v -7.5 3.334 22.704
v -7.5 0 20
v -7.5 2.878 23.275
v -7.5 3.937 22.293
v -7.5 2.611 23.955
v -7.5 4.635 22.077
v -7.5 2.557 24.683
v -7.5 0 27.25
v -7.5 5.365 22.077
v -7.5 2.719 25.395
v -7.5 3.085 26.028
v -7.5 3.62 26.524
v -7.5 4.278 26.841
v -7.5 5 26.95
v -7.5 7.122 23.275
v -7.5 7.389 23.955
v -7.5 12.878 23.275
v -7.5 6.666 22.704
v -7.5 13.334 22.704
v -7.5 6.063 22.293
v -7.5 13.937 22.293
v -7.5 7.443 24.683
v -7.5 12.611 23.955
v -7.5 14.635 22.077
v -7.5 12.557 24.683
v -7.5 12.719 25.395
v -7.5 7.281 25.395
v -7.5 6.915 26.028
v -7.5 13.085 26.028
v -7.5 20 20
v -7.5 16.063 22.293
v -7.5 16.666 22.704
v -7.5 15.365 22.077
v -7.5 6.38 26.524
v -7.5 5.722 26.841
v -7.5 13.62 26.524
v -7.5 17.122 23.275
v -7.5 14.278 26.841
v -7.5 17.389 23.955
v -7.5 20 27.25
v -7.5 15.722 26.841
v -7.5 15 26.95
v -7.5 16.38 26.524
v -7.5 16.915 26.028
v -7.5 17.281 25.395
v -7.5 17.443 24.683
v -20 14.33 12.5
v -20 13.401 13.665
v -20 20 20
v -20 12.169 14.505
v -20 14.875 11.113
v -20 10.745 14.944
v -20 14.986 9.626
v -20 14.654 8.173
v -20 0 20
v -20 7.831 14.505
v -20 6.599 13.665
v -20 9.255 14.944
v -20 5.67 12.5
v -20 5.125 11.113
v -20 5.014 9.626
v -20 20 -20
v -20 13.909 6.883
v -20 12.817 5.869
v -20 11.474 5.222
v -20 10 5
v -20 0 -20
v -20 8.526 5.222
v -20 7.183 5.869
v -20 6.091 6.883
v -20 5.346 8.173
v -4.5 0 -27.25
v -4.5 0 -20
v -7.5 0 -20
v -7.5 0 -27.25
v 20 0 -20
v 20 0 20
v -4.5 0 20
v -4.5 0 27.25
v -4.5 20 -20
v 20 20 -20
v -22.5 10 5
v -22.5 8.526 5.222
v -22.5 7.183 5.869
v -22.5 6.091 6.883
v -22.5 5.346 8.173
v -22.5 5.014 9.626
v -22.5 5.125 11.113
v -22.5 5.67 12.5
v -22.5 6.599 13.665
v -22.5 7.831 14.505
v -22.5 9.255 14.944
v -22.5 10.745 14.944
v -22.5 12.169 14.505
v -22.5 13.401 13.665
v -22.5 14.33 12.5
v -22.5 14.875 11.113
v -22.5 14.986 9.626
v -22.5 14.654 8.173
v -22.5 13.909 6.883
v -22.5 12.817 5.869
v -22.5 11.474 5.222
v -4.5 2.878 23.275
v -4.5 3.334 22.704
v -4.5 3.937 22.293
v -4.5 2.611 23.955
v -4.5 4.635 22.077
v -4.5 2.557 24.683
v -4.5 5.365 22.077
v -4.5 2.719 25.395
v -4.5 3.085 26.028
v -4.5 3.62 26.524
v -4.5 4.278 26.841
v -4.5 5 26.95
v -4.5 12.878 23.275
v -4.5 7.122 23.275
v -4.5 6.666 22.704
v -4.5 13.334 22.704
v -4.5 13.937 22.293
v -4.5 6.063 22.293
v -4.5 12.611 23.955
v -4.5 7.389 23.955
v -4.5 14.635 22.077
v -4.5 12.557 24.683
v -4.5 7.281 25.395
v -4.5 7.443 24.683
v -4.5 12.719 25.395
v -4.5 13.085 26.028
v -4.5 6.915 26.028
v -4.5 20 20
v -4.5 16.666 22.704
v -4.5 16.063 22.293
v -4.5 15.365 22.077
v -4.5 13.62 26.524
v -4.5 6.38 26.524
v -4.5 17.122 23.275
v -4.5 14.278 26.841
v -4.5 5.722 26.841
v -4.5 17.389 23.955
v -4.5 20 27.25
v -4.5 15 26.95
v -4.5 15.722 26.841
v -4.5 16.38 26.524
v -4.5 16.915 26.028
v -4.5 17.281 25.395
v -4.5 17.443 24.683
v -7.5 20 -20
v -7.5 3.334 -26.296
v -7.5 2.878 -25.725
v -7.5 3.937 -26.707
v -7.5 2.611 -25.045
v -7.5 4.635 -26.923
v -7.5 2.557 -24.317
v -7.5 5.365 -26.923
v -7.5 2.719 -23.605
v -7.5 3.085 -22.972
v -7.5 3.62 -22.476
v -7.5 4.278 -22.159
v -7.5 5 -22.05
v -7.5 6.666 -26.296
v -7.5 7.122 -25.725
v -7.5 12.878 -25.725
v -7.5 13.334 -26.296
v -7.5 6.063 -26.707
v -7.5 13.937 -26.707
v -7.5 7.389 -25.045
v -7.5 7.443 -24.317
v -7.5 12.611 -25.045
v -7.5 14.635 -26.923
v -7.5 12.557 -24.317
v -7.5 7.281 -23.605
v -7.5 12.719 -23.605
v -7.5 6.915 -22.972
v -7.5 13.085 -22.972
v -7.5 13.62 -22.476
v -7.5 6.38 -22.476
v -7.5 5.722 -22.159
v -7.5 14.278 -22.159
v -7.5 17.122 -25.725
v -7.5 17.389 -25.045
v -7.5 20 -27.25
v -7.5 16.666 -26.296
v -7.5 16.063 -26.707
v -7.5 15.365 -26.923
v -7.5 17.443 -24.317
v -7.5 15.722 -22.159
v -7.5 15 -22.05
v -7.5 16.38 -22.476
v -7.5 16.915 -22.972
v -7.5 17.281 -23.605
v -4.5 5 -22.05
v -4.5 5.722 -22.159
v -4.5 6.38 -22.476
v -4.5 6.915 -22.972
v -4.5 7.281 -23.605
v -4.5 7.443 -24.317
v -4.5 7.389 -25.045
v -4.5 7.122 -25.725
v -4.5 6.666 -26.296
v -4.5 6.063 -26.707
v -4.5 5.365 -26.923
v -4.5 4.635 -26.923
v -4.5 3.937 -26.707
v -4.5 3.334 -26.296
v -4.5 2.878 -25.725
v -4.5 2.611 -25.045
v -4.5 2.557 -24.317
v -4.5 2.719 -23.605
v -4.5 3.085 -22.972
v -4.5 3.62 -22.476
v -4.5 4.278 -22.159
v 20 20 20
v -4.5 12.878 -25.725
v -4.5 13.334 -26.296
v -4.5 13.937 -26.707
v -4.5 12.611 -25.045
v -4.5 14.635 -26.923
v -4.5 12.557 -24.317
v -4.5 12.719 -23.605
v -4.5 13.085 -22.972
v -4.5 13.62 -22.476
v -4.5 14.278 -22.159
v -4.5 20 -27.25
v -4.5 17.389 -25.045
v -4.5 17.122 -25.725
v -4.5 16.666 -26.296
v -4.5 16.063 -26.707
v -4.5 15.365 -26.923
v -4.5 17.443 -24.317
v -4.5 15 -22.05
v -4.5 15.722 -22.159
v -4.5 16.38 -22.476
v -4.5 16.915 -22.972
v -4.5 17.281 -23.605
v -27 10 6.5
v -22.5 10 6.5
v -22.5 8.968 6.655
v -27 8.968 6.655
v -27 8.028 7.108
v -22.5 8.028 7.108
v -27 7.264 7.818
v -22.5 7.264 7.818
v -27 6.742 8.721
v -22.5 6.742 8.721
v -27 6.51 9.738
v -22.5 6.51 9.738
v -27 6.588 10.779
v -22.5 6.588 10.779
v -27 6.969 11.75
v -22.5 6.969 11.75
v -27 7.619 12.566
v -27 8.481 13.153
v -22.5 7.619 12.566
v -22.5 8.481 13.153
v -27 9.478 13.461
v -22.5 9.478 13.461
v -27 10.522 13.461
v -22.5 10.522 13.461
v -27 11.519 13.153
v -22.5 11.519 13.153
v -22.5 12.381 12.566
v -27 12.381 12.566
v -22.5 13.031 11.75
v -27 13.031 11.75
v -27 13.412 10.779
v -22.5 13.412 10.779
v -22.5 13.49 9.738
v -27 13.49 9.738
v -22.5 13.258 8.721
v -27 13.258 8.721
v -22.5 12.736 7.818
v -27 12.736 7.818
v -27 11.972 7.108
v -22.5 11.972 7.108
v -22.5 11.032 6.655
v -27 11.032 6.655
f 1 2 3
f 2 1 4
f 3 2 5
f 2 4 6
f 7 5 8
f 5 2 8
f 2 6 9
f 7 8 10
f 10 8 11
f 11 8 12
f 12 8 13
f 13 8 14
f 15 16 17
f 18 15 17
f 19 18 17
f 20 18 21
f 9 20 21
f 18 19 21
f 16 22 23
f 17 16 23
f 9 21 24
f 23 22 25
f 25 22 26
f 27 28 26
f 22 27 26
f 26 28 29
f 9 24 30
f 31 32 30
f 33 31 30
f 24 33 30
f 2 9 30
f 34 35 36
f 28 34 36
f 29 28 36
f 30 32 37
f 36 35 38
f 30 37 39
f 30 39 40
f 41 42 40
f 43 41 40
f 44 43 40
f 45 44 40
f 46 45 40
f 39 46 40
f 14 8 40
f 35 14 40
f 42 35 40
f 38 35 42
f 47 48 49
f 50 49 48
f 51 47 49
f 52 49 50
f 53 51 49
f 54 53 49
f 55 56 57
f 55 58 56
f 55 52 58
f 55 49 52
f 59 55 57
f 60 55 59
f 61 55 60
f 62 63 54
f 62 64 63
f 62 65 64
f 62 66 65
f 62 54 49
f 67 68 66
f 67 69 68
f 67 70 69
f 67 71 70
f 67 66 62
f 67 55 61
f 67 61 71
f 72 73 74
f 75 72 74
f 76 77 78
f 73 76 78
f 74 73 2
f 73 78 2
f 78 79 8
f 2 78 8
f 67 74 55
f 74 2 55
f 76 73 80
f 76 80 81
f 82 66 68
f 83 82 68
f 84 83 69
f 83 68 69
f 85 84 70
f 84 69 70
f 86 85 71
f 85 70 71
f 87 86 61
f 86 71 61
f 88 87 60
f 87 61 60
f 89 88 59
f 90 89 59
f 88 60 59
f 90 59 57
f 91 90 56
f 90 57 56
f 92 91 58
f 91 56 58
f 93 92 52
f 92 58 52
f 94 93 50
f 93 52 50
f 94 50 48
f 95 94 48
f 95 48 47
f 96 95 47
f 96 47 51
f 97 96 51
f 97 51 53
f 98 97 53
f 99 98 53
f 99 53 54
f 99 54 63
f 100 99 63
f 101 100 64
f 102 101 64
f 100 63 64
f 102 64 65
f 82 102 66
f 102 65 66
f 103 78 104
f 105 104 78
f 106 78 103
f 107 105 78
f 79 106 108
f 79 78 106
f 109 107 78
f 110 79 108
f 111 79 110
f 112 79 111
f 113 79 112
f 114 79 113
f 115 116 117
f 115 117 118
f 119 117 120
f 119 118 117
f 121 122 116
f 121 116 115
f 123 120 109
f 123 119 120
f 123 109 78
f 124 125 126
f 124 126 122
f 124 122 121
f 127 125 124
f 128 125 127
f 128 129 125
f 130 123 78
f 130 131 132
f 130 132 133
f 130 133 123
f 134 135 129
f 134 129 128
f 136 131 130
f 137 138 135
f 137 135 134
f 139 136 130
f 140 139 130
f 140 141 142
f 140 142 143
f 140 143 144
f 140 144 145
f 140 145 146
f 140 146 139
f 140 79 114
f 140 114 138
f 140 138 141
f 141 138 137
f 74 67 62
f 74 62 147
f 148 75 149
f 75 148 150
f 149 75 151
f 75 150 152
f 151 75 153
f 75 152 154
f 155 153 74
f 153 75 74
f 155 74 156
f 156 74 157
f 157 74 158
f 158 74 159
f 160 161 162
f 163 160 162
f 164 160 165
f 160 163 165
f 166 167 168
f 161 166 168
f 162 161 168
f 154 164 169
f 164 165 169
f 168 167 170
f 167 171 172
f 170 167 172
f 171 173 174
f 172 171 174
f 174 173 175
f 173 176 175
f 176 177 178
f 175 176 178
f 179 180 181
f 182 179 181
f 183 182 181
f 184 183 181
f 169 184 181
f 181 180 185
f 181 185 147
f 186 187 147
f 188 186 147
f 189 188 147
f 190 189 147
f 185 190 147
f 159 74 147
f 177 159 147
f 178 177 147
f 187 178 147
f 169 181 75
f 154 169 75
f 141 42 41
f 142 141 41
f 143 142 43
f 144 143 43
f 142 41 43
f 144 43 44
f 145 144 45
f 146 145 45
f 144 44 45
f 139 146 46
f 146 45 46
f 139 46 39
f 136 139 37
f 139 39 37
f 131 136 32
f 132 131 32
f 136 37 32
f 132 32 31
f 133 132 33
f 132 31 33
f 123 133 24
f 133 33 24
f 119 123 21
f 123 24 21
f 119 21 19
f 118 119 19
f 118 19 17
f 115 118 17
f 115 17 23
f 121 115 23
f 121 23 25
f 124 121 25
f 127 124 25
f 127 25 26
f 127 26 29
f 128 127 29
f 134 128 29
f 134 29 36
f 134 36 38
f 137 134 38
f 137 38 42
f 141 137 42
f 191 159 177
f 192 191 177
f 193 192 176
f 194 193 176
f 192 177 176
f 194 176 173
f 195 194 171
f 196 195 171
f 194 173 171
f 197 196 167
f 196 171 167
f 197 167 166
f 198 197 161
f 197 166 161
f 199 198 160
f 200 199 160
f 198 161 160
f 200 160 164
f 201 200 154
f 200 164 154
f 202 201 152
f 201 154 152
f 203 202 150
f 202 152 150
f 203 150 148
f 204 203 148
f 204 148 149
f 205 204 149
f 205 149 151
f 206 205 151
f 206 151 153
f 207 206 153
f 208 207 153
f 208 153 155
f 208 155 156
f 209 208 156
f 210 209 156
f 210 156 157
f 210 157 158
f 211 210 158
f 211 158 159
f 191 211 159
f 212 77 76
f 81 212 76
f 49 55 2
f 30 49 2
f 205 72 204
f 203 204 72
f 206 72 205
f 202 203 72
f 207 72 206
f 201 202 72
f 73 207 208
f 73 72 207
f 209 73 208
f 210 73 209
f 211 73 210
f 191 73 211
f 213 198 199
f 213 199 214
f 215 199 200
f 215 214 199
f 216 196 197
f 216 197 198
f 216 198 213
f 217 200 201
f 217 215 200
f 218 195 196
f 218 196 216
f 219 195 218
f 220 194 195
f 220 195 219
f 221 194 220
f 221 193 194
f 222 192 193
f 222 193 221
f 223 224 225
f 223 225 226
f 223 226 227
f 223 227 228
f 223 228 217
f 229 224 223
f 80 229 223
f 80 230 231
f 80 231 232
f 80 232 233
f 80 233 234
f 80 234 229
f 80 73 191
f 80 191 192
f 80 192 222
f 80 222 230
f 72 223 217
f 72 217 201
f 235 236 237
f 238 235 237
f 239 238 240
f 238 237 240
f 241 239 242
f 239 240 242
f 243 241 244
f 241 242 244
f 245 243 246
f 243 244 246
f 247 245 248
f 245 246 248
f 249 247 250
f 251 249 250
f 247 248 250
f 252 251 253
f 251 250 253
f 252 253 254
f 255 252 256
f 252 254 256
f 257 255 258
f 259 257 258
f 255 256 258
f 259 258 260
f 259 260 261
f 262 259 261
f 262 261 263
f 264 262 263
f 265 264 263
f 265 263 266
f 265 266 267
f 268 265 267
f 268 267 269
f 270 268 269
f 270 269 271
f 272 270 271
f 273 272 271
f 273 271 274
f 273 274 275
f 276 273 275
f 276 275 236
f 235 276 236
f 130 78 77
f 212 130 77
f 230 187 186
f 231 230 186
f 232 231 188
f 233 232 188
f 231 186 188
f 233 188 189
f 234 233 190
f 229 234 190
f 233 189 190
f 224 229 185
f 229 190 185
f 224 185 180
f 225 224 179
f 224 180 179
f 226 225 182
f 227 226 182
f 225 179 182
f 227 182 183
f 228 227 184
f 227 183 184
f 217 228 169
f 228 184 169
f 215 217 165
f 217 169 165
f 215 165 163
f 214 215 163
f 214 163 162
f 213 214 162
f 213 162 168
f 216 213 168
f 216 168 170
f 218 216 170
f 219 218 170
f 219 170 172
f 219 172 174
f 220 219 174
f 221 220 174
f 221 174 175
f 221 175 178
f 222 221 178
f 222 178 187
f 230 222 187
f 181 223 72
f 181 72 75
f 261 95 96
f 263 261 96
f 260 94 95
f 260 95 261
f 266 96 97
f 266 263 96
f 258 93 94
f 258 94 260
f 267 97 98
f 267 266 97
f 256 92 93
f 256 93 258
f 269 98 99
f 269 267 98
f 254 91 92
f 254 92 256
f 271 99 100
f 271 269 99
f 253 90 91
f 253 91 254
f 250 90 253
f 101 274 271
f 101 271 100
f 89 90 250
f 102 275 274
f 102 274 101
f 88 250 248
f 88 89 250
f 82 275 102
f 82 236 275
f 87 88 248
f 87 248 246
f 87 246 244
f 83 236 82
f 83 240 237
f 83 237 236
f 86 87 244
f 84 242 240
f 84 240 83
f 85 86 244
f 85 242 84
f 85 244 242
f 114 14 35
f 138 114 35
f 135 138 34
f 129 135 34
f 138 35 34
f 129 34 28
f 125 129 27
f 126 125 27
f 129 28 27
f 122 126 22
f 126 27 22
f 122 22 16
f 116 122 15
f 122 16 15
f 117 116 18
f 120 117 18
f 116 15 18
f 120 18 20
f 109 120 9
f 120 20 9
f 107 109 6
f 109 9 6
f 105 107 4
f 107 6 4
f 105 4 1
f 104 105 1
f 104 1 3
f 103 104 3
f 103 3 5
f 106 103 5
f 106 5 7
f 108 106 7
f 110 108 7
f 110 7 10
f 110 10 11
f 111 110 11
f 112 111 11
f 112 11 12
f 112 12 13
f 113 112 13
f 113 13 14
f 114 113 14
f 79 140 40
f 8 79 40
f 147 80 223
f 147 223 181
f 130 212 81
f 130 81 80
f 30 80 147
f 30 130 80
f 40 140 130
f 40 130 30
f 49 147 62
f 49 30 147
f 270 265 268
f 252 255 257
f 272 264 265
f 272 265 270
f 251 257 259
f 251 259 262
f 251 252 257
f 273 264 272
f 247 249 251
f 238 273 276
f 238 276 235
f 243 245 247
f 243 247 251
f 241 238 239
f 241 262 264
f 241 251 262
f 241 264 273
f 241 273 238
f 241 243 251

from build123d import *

# Parameters (mm, degrees)
SKETCH_1_W           = 40
SKETCH_1_H           = 40
EXTRUDE_1_DEPTH      = 20
EXTRUDE_2_DEPTH      = 7.25
EXTRUDE_2_DEPTH_BACK = 47.25
SKETCH_4_W           = 3
SKETCH_4_H           = 20
SKETCH_5_R           = 2.45
CUT_EXTRUDE_3_DEPTH  = 7.25
SKETCH_6_R           = 3.5
EXTRUDE_3_DEPTH      = 7
SKETCH_7_R           = 5
EXTRUDE_4_DEPTH      = 2.5


with BuildPart() as part:
    # 草图1 → 凸台-拉伸1 (new body)
    with BuildSketch(Plane(origin=(0, 0, 0), x_dir=(1, 0, 0), z_dir=(0, 1, 0))):
        Rectangle(SKETCH_1_W, SKETCH_1_H)
    extrude(amount=EXTRUDE_1_DEPTH)

    # 草图4 → 凸台-拉伸2 (add, two sides: drawn at the far end of the back side and taken through both)
    with BuildSketch(Plane(origin=(0, 0, -20), x_dir=(-1, 0, 0), z_dir=(0, 0, -1)).offset(-EXTRUDE_2_DEPTH_BACK)):
        with Locations((6, 10)):
            Rectangle(SKETCH_4_W, SKETCH_4_H)
    extrude(amount=EXTRUDE_2_DEPTH + EXTRUDE_2_DEPTH_BACK)

    # 草图5 → 切除-拉伸3 (cut)
    with BuildSketch(Plane.ZY.offset(7.5)):
        with Locations((-24.5, 15)):
            Circle(SKETCH_5_R)
        with Locations((24.5, 15)):
            Circle(SKETCH_5_R)
        with Locations((24.5, 5)):
            Circle(SKETCH_5_R)
        with Locations((-24.5, 5)):
            Circle(SKETCH_5_R)
    extrude(amount=-CUT_EXTRUDE_3_DEPTH, mode=Mode.SUBTRACT)

    # 草图6 → 凸台-拉伸3 (add)
    with BuildSketch(Plane.ZY.offset(20)):
        with Locations(Location((10, 10, 0), (0, 0, 180))):
            Circle(SKETCH_6_R)
    extrude(amount=EXTRUDE_3_DEPTH)

    # 草图7 → 凸台-拉伸4 (add)
    with BuildSketch(Plane.ZY.offset(20)):
        with Locations(Location((10, 10, 0), (0, 0, 180))):
            Circle(SKETCH_7_R)
    extrude(amount=EXTRUDE_4_DEPTH)


solid = part.part
